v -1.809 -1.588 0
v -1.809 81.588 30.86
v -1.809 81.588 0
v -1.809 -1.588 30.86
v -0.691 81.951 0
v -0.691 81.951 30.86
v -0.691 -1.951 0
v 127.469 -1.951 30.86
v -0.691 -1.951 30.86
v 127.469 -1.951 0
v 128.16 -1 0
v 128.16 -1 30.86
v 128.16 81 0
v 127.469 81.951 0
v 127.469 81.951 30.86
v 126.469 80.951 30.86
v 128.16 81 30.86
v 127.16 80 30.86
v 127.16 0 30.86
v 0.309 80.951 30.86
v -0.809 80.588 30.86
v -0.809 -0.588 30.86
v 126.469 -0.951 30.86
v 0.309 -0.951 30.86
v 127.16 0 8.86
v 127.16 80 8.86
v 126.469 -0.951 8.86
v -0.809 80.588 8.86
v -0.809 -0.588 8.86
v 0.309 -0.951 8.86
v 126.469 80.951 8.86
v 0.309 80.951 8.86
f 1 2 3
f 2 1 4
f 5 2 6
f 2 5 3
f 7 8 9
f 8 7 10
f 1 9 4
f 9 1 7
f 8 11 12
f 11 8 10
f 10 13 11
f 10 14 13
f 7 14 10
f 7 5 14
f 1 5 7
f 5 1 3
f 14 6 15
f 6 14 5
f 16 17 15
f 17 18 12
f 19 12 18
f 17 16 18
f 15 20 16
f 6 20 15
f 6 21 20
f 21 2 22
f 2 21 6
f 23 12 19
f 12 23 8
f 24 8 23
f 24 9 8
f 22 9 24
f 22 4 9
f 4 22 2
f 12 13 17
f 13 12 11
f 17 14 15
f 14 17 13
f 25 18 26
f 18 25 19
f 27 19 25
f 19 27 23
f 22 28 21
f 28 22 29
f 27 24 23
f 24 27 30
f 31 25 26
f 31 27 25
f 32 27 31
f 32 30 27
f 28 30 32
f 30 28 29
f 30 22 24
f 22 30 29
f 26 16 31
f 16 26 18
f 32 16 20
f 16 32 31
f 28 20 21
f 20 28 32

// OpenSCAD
//Changeable values
width = 126.16;
length = 80;
wall_height = 22;
z_offset = 8.86;
wall_thickness = 1;
//z_offset = 0; /* This is a temp */

//Non-changeable values
height = z_offset + wall_height;


//Negative space
top_right_point = [width, length, z_offset];
top_left_point = [width, 0, z_offset];
bottom_right_point = [0, length, z_offset];
bottom_left_point = [0, 0, z_offset];

//Base space
top_right_point_base = [width + wall_thickness, length + wall_thickness, 0];
top_left_point_base = [width + wall_thickness, -wall_thickness, 0];
bottom_right_point_base = [-wall_thickness, length + wall_thickness, 0];
bottom_left_point_base = [-wall_thickness, -wall_thickness, 0];

difference(){
    hull(){
        translate(top_right_point_base){
            cylinder(height);
        }

        translate(top_left_point_base){
            cylinder(height);
        }

        translate(bottom_right_point_base){
            cylinder(height);
        }

        translate(bottom_left_point_base){
            cylinder(height);
        }
    }

    hull(){
        translate(top_right_point){
            cylinder(height);
        }

        translate(top_left_point){
            cylinder(height);
        }

        translate(bottom_right_point){
            cylinder(height);
        }

        translate(bottom_left_point){
            cylinder(height);
        }
    }
}
